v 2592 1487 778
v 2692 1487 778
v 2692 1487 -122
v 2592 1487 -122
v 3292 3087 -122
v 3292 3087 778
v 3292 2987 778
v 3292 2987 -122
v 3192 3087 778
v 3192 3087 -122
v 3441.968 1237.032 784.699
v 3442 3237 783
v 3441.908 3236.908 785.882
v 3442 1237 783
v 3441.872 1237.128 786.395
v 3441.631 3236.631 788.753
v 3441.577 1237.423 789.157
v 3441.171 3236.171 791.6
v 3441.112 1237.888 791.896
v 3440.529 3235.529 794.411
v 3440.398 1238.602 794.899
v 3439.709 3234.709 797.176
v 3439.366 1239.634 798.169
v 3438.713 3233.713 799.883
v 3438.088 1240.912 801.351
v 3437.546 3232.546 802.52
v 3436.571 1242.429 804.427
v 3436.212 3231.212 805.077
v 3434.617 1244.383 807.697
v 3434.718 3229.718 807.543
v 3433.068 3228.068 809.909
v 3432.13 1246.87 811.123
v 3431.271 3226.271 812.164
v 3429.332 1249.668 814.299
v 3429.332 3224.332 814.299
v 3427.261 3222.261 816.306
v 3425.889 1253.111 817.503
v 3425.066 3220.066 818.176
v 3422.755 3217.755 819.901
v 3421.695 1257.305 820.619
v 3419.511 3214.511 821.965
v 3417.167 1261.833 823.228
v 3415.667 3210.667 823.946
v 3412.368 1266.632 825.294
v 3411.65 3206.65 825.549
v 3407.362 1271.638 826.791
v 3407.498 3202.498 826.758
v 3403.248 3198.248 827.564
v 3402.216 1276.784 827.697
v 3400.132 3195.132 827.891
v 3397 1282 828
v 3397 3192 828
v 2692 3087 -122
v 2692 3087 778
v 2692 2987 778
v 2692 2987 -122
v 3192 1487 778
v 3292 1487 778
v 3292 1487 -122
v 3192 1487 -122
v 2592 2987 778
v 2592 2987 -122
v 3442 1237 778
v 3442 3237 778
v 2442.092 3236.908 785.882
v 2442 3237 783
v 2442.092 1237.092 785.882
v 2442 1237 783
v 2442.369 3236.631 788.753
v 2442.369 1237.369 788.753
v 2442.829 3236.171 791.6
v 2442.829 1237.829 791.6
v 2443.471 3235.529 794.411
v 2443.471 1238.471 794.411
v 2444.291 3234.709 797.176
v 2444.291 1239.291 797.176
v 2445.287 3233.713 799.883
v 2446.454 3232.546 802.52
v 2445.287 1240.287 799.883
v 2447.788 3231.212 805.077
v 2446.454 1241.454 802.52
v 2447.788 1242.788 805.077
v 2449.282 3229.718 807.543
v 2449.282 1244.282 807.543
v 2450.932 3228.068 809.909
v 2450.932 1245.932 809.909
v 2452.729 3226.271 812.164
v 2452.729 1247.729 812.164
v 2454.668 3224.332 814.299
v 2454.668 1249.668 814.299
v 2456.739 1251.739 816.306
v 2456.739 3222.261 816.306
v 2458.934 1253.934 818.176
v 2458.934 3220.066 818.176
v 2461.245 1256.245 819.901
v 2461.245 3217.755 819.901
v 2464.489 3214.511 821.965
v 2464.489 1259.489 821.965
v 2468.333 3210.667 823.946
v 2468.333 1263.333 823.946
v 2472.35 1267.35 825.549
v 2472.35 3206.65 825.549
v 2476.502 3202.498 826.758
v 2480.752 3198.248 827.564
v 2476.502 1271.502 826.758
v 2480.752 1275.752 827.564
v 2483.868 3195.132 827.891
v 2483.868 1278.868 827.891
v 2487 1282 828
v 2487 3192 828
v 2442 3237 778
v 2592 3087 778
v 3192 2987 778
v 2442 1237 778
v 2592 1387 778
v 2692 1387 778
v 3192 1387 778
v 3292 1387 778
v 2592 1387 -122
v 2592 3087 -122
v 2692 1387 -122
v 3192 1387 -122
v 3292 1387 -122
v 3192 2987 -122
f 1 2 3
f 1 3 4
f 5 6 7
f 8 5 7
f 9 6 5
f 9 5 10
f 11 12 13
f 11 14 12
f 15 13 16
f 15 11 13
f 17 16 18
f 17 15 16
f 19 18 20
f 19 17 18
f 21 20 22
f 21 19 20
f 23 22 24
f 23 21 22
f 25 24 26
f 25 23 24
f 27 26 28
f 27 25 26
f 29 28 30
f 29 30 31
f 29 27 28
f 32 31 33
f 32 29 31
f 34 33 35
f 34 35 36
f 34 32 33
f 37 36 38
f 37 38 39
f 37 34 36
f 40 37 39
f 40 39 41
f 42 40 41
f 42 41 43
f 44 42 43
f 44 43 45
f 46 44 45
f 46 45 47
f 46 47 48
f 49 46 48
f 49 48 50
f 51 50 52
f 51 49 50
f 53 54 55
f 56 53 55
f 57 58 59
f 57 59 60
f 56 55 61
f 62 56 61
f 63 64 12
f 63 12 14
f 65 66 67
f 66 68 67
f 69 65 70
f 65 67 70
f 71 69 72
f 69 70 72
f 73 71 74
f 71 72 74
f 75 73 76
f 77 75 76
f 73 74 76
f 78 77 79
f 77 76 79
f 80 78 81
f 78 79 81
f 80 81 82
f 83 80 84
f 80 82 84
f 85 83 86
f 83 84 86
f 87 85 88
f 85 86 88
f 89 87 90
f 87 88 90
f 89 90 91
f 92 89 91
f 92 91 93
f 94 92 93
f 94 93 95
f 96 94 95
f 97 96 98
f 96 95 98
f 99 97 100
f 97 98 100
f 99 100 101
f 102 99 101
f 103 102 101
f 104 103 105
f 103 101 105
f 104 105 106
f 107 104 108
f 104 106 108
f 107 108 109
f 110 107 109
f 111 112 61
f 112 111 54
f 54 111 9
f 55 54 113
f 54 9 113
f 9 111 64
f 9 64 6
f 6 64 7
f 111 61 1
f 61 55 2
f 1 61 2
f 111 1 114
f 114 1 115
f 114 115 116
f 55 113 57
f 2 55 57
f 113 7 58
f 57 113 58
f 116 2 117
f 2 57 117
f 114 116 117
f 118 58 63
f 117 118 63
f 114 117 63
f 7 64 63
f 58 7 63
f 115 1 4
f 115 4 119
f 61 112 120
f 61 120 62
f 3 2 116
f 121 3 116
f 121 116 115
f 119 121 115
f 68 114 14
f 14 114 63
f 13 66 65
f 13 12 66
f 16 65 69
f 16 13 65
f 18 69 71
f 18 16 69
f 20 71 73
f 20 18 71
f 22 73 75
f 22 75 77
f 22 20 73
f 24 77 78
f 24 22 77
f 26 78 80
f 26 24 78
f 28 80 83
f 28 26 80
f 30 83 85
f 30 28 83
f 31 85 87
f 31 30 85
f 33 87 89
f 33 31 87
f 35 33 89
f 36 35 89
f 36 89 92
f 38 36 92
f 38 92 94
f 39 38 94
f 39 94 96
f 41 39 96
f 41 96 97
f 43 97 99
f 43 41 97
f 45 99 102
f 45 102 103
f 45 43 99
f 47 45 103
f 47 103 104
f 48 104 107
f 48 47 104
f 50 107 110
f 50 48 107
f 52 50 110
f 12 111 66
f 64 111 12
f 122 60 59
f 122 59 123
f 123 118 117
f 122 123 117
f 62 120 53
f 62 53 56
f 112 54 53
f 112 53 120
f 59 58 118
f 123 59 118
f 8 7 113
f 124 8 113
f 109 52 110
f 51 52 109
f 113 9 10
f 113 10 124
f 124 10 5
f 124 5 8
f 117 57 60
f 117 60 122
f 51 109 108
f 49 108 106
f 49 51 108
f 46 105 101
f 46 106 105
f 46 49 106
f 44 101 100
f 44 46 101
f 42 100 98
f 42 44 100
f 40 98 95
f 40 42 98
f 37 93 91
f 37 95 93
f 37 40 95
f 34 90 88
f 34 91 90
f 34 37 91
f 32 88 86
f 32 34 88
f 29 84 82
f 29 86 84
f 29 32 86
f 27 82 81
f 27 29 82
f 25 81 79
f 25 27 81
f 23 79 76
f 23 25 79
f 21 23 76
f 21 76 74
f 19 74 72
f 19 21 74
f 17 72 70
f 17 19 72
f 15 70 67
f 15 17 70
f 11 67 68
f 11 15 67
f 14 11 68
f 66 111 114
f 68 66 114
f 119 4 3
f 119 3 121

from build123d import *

# Parameters (mm, degrees)
SKETCH011_W             = 2000
SKETCH011_H             = 1000
PAD004_DEPTH            = 50
SKETCH012_W             = 100
SKETCH012_H             = 100
PAD005_DEPTH            = 900
SKETCH013_W             = 100
SKETCH013_H             = 100
PAD006_DEPTH            = 900
SKETCH014_W             = 100
SKETCH014_H             = 100
PAD007_DEPTH            = 900
SKETCH015_W             = 100
SKETCH015_H             = 100
PAD008_DEPTH            = 900
FILLET010_R             = 45
BODY002_PLACEMENT_ANGLE = 90


with BuildPart() as part:
    # Sketch011 → Pad004 (new body)
    with BuildSketch(Plane.XY):
        with Locations((1000, 500)):
            Rectangle(SKETCH011_W, SKETCH011_H)
    extrude(amount=PAD004_DEPTH)

    # Sketch012 (on Face5 of Pad004) → Pad005 (join)
    with BuildSketch(Plane(origin=(0, 0, 0), x_dir=(1, 0, 0), z_dir=(0, 0, -1))):
        with Locations((200, -200)):
            Rectangle(SKETCH012_W, SKETCH012_H)
    extrude(amount=PAD005_DEPTH)

    # Sketch013 (on Face4 of Pad005) → Pad006 (join)
    with BuildSketch(Plane(origin=(0, 0, 0), x_dir=(1, 0, 0), z_dir=(0, 0, -1))):
        with Locations((1800, -200)):
            Rectangle(SKETCH013_W, SKETCH013_H)
    extrude(amount=PAD006_DEPTH)

    # Sketch014 (on Face4 of Pad006) → Pad007 (join)
    with BuildSketch(Plane(origin=(0, 0, 0), x_dir=(1, 0, 0), z_dir=(0, 0, -1))):
        with Locations((200, -800)):
            Rectangle(SKETCH014_W, SKETCH014_H)
    extrude(amount=PAD007_DEPTH)

    # Sketch015 (on Face4 of Pad007) → Pad008 (join)
    with BuildSketch(Plane(origin=(0, 0, 0), x_dir=(1, 0, 0), z_dir=(0, 0, -1))):
        with Locations((1800, -800)):
            Rectangle(SKETCH015_W, SKETCH015_H)
    extrude(amount=PAD008_DEPTH)

    # Fillet010
    fillet010_edges = [part.edges().sort_by_distance(p)[0] for p in [
        (1000, 0, 50),
        (2000, 500, 50),
        (1000, 1000, 50),
        (0, 500, 50),
    ]]
    fillet(fillet010_edges, radius=FILLET010_R)


with BuildPart() as part_1:
    # Body002 placement: moved
    add(part.part.moved(Location((2442, 3237, 778))).rotate(Axis((2442, 3237, 778), (0, 0, -1)), BODY002_PLACEMENT_ANGLE))


solid = part_1.part
